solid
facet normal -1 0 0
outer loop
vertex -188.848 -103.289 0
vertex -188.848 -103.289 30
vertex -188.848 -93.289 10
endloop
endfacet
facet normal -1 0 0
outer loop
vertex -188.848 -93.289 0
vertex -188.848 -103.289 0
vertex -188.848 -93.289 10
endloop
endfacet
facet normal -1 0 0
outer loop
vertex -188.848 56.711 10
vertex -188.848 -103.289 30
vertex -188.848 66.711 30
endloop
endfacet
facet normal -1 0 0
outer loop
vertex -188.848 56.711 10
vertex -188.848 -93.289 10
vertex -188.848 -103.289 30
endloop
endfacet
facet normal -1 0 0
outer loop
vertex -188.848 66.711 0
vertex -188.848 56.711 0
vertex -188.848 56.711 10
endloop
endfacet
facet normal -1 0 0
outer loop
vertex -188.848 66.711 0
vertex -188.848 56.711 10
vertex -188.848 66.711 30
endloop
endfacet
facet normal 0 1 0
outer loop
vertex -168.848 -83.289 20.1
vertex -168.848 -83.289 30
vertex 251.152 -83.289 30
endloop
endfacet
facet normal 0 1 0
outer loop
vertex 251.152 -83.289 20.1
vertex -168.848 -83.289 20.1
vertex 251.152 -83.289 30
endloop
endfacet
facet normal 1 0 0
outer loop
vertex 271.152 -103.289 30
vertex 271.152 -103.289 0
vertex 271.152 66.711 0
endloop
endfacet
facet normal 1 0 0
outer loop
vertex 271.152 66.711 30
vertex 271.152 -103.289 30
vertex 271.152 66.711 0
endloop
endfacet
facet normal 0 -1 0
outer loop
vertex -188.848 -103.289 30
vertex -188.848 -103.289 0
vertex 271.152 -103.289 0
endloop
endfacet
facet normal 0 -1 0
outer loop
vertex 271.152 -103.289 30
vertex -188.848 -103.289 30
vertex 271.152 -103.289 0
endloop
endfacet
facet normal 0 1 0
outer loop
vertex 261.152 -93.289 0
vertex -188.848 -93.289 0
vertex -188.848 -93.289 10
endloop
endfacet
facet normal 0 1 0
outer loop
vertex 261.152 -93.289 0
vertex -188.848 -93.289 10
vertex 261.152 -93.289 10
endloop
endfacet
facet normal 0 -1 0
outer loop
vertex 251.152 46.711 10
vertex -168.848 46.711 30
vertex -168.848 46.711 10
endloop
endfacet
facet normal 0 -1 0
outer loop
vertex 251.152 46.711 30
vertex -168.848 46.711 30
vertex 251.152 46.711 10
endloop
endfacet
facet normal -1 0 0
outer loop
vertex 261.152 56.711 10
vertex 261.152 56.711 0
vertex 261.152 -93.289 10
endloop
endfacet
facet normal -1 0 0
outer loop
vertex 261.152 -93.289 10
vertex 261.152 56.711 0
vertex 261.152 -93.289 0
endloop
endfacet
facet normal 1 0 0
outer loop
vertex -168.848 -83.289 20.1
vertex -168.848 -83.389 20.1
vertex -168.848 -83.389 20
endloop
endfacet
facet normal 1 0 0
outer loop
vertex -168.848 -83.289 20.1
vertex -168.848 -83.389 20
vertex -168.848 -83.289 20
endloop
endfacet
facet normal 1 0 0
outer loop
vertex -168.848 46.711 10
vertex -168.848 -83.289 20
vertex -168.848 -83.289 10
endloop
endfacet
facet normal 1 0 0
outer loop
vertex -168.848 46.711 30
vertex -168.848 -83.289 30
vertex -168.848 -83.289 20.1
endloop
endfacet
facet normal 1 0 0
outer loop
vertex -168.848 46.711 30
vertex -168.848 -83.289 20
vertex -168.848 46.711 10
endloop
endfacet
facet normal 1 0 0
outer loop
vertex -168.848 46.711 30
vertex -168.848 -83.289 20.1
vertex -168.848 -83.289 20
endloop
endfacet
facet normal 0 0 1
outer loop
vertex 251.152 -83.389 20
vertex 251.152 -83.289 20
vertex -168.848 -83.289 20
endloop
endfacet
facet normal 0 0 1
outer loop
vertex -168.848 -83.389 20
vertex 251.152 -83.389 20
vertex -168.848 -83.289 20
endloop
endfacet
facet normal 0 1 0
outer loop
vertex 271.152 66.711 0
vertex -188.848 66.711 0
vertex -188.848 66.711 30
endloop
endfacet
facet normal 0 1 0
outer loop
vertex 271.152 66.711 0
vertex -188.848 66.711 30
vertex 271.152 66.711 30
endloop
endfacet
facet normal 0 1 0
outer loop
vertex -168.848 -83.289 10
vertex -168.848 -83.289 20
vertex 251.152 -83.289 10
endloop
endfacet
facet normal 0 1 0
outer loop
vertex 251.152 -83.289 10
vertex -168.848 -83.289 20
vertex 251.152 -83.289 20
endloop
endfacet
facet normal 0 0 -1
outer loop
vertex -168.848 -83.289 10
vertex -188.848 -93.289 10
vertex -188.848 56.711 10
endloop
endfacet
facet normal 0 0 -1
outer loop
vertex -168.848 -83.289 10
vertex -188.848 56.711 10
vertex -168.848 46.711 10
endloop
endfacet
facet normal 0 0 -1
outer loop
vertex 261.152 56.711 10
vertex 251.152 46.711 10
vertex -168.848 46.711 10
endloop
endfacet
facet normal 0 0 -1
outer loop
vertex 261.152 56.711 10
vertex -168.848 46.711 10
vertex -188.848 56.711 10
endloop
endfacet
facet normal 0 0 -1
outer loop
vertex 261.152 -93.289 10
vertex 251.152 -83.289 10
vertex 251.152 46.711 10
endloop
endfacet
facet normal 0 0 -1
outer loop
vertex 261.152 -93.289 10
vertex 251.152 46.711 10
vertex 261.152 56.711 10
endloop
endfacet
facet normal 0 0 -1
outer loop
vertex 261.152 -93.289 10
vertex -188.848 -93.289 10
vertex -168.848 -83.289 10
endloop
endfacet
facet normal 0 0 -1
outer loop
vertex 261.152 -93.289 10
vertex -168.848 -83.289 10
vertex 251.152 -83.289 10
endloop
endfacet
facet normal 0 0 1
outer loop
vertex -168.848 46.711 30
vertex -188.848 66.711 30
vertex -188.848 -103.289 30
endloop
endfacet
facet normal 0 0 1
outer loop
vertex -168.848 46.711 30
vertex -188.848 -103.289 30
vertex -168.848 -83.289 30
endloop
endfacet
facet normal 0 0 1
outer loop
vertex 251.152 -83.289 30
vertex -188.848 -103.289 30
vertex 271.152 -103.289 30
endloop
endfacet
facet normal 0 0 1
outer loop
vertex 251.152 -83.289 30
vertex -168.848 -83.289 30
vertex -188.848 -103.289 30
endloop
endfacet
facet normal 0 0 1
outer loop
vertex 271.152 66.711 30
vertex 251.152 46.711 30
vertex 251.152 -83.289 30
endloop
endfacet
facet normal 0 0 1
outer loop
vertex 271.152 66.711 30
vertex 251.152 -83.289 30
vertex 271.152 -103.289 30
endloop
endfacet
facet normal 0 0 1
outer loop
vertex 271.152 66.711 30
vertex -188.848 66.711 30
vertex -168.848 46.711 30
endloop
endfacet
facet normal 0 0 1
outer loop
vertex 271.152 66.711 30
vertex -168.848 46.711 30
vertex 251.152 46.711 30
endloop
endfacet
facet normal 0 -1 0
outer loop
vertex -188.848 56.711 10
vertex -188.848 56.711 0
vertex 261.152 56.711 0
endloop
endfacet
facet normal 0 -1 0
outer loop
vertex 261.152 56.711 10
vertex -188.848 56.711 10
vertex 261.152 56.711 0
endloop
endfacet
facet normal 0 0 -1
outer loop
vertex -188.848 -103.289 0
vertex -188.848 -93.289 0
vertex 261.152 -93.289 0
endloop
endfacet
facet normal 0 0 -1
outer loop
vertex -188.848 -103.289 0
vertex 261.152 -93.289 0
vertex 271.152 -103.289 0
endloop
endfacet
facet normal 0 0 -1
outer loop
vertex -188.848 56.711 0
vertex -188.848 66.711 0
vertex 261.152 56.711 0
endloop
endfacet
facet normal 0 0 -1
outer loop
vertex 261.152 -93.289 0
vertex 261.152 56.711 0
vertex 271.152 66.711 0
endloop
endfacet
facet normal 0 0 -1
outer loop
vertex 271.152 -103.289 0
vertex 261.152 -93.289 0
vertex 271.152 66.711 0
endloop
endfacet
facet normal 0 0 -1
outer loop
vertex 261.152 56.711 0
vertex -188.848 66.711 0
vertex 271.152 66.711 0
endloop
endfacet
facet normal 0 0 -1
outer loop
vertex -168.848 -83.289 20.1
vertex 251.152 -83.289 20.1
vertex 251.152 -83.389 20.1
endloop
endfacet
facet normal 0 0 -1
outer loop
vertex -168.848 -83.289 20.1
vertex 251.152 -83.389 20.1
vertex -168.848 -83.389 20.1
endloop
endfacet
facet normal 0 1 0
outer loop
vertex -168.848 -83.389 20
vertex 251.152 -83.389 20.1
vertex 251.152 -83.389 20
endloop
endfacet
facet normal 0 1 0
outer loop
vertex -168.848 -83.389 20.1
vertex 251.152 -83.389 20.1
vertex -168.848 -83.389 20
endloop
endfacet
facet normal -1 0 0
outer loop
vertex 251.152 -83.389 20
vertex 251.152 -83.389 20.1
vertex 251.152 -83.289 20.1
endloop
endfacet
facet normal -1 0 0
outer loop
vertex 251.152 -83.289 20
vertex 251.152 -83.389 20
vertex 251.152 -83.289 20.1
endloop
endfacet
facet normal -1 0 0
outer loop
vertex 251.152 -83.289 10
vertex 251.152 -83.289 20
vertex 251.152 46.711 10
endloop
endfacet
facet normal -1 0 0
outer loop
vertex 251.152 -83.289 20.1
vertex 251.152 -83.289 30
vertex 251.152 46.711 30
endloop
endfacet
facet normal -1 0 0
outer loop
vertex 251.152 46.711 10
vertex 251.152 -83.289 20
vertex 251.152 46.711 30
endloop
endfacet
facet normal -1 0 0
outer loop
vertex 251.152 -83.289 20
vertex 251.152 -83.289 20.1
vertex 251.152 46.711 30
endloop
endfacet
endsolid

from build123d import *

# Parameters (mm, degrees)
F0_W     = 460
F0_H     = 170
F1_DEPTH = 30
F2_W     = 420
F2_H     = 130
F3_DEPTH = 30
F4_W     = 450
F4_H     = 150
F5_DEPTH = 10
F6_W     = 420
F6_H     = 0.1
F7_DEPTH = 0.1


with BuildPart() as f1:
    # F0 (on Top) → F1 (new body)
    with BuildSketch(Plane.XY):
        with Locations((41.152232, -18.289462)):
            Rectangle(F0_W, F0_H)
    extrude(amount=F1_DEPTH)

    # F2 (on face) → F3 (cut, through all)
    with BuildSketch(Plane.XY.offset(30)):
        with Locations((41.152232, -18.289462)):
            Rectangle(F2_W, F2_H)
    extrude(amount=-F3_DEPTH, mode=Mode.SUBTRACT)

    # F4 (on face) → F5 (cut)
    with BuildSketch(Plane(origin=(0, 0, 0), x_dir=(1, 0, 0), z_dir=(0, 0, -1))):
        with Locations((36.152232, 18.289462)):
            Rectangle(F4_W, F4_H)
    extrude(amount=-F5_DEPTH, mode=Mode.SUBTRACT)

    # F6 (on face) → F7 (cut)
    with BuildSketch(Plane(origin=(0, -83.289462, 0), x_dir=(-1, 0, 0), z_dir=(0, 1, 0))):
        with Locations((-41.152232, 20.05)):
            Rectangle(F6_W, F6_H)
    extrude(amount=-F7_DEPTH, mode=Mode.SUBTRACT)


solid = f1.part
